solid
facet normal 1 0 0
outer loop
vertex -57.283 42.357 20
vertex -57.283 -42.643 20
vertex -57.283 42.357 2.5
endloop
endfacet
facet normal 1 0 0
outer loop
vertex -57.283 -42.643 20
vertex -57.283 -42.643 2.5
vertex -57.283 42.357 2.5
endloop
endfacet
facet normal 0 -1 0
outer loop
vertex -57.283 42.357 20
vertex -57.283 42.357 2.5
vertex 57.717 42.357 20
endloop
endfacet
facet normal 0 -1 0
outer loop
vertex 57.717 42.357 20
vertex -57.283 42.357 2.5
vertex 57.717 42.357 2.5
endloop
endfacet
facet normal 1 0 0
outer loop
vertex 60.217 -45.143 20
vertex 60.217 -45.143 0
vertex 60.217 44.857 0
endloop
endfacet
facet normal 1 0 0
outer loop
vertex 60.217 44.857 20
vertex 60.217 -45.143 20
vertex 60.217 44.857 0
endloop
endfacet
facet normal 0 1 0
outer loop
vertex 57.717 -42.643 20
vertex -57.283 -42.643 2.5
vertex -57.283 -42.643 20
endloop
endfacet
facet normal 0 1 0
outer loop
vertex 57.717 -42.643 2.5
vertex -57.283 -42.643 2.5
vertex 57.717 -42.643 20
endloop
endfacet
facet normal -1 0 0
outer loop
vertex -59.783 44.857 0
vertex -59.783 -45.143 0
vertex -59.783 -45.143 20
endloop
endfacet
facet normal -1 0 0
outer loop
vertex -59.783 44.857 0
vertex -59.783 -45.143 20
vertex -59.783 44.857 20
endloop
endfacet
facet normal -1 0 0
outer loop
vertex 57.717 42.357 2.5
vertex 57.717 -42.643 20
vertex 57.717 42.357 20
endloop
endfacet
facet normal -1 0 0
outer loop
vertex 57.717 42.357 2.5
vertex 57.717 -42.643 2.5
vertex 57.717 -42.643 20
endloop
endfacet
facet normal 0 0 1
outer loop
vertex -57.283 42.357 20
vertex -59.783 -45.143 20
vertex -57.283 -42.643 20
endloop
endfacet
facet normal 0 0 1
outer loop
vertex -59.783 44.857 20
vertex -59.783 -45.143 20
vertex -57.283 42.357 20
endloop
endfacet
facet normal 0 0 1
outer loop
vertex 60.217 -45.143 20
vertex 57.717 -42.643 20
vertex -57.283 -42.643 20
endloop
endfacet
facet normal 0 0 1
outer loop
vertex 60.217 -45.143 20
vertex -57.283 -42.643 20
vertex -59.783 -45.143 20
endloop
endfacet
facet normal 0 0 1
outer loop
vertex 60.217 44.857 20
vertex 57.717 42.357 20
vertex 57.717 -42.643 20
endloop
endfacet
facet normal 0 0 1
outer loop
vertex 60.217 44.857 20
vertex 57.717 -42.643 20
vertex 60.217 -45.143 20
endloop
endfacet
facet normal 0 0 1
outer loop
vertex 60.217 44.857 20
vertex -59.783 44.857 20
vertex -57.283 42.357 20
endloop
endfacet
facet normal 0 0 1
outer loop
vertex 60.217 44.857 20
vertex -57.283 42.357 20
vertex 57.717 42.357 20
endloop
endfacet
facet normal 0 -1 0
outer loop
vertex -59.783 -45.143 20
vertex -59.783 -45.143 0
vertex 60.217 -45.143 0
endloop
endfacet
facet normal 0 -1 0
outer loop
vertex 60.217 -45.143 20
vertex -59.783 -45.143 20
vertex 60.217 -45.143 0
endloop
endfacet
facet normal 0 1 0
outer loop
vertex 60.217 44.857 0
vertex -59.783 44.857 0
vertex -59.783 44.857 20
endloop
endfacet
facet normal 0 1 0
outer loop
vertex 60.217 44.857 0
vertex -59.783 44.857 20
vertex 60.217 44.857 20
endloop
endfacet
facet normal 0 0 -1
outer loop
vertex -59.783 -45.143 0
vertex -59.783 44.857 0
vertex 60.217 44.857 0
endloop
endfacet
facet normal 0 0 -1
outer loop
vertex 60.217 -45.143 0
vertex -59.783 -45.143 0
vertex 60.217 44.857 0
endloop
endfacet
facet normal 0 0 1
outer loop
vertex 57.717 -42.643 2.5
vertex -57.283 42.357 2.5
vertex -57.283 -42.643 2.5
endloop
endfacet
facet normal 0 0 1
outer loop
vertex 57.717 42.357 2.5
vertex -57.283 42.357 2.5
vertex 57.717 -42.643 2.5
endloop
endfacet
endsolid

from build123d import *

# Parameters (mm, degrees)
F0_W     = 120
F0_H     = 90
F1_DEPTH = 20
F2_T     = -2.5


# Not quite as in the source:
# - a feature names something its author has since deleted; it is built from what else it names


with BuildPart() as f1:
    # F0 (on Top) → F1 (new body)
    with BuildSketch(Plane.XY):
        with Locations((0.2172155073, -0.1426615352)):
            Rectangle(F0_W, F0_H)
    extrude(amount=F1_DEPTH)

    # F2
    f2_openings = [f1.faces().sort_by_distance(p)[0] for p in [
        (0.217216, -0.142662, 20),
    ]]
    offset(amount=F2_T, openings=f2_openings)


solid = f1.part
